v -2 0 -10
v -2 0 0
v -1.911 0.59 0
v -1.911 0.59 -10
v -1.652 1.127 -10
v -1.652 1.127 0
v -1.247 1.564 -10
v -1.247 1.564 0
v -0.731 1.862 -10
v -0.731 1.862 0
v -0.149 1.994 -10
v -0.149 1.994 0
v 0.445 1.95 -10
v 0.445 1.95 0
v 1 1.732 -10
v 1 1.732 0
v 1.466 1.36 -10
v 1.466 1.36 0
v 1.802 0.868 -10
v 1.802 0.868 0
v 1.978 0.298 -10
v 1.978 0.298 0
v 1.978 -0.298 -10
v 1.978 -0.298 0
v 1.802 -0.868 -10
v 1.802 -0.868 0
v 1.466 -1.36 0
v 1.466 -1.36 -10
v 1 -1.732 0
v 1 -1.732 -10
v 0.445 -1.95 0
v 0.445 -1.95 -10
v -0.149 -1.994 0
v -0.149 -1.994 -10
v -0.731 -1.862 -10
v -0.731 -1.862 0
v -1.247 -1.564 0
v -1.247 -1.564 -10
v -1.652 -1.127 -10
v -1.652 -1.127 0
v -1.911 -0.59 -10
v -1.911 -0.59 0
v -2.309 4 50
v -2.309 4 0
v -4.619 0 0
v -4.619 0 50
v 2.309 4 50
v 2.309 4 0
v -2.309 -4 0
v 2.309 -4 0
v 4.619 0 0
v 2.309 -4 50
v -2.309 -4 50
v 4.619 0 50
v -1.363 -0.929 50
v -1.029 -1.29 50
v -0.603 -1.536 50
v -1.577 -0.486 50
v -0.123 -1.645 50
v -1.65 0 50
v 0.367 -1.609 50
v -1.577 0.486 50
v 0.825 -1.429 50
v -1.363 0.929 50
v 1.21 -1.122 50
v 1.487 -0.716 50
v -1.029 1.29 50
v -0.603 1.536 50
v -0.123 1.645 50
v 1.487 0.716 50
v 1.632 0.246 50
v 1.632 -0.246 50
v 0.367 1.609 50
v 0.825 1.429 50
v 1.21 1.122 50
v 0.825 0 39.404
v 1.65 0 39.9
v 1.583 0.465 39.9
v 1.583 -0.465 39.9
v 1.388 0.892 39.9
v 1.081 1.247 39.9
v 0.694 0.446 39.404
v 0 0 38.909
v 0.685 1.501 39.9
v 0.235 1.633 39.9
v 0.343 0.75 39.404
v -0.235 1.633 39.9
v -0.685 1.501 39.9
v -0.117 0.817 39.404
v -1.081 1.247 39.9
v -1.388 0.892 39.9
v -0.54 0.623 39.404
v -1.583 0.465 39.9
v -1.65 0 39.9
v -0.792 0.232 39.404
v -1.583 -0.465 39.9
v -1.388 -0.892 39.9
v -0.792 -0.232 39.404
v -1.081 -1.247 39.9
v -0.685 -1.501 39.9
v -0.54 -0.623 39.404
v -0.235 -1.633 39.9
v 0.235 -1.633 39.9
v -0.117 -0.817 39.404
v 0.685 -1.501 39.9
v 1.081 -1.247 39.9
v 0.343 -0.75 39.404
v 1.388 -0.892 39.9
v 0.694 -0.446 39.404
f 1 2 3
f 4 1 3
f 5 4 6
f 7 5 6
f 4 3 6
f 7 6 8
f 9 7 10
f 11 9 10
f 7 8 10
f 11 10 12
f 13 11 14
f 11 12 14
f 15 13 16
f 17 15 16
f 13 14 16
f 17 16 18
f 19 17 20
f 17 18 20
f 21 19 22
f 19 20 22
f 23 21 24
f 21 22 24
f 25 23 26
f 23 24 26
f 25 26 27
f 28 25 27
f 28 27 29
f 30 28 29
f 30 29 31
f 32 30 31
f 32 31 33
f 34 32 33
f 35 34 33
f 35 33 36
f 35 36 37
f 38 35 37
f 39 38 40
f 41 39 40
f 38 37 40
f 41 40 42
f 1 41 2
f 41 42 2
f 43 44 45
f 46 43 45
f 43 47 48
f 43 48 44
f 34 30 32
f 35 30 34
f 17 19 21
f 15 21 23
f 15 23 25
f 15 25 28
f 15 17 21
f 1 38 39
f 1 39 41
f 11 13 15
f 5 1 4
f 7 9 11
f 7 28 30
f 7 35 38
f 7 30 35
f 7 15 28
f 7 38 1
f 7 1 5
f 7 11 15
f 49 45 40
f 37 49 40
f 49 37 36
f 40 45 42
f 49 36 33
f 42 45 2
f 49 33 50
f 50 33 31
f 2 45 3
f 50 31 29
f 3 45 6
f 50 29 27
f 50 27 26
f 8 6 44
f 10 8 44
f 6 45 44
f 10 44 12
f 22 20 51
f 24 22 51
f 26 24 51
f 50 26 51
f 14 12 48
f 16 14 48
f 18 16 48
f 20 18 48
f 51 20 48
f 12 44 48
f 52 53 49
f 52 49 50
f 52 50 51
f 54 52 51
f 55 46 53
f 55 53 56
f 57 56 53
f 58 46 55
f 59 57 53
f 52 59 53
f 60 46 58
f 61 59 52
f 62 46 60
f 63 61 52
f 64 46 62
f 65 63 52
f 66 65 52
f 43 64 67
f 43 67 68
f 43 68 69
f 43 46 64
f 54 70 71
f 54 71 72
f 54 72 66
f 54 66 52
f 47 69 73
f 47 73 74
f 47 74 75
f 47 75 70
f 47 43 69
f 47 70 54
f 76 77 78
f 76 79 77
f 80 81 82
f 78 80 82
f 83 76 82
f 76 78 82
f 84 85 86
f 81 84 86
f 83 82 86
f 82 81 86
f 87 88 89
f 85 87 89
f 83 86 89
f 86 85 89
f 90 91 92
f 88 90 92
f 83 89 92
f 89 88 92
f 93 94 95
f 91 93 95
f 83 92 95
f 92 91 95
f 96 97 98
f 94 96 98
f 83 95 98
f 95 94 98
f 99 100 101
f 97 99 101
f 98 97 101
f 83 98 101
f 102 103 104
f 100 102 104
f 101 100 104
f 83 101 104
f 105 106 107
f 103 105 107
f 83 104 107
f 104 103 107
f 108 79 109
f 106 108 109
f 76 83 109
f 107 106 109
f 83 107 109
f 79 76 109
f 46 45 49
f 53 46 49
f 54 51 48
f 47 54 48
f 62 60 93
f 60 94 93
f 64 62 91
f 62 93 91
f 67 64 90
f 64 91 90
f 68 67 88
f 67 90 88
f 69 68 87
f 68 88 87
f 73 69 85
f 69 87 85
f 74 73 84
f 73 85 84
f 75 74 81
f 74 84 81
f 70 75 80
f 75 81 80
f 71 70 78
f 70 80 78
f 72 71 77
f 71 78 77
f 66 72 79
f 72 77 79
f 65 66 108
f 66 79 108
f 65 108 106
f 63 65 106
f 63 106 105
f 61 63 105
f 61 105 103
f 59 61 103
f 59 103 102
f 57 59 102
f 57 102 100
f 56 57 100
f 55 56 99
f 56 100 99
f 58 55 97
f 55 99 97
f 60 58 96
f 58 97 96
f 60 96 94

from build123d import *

# Parameters (mm, degrees)
EXTRUDE_1_DEPTH = 50
SKETCH_4_R      = 2
EXTRUDE_2_DEPTH = 10
M4X0_7_1_D      = 3.3
M4X0_7_1_DEPTH  = 10.1
M4X0_7_1_TIP    = 0.991420021


with BuildPart() as part:
    # 草圖1 → 填料-伸長1 (new body)
    with BuildSketch(Plane.XY):
        Polygon((-2.309401077, 4), (-4.618802154, 0), (-2.309401077, -4), (2.309401077, -4), (4.618802154, 0), (2.309401077, 4), align=None)
    extrude(amount=EXTRUDE_1_DEPTH)

    # 草圖4 → 填料-伸長2 (add)
    with BuildSketch(Plane(origin=(0, 0, 0), x_dir=(-1, 0, 0), z_dir=(0, 0, -1))):
        Circle(SKETCH_4_R)
    extrude(amount=EXTRUDE_2_DEPTH)

    # M4x0.7 螺紋孔1
    with Locations(Plane.XY.offset(50)):
        with Locations((0, 0)):
            Hole(M4X0_7_1_D / 2, depth=M4X0_7_1_DEPTH)
            with Locations((0, 0, -(M4X0_7_1_DEPTH + M4X0_7_1_TIP / 2))):  # 118° drill point
                Cone(0, M4X0_7_1_D / 2, M4X0_7_1_TIP, mode=Mode.SUBTRACT)


solid = part.part
